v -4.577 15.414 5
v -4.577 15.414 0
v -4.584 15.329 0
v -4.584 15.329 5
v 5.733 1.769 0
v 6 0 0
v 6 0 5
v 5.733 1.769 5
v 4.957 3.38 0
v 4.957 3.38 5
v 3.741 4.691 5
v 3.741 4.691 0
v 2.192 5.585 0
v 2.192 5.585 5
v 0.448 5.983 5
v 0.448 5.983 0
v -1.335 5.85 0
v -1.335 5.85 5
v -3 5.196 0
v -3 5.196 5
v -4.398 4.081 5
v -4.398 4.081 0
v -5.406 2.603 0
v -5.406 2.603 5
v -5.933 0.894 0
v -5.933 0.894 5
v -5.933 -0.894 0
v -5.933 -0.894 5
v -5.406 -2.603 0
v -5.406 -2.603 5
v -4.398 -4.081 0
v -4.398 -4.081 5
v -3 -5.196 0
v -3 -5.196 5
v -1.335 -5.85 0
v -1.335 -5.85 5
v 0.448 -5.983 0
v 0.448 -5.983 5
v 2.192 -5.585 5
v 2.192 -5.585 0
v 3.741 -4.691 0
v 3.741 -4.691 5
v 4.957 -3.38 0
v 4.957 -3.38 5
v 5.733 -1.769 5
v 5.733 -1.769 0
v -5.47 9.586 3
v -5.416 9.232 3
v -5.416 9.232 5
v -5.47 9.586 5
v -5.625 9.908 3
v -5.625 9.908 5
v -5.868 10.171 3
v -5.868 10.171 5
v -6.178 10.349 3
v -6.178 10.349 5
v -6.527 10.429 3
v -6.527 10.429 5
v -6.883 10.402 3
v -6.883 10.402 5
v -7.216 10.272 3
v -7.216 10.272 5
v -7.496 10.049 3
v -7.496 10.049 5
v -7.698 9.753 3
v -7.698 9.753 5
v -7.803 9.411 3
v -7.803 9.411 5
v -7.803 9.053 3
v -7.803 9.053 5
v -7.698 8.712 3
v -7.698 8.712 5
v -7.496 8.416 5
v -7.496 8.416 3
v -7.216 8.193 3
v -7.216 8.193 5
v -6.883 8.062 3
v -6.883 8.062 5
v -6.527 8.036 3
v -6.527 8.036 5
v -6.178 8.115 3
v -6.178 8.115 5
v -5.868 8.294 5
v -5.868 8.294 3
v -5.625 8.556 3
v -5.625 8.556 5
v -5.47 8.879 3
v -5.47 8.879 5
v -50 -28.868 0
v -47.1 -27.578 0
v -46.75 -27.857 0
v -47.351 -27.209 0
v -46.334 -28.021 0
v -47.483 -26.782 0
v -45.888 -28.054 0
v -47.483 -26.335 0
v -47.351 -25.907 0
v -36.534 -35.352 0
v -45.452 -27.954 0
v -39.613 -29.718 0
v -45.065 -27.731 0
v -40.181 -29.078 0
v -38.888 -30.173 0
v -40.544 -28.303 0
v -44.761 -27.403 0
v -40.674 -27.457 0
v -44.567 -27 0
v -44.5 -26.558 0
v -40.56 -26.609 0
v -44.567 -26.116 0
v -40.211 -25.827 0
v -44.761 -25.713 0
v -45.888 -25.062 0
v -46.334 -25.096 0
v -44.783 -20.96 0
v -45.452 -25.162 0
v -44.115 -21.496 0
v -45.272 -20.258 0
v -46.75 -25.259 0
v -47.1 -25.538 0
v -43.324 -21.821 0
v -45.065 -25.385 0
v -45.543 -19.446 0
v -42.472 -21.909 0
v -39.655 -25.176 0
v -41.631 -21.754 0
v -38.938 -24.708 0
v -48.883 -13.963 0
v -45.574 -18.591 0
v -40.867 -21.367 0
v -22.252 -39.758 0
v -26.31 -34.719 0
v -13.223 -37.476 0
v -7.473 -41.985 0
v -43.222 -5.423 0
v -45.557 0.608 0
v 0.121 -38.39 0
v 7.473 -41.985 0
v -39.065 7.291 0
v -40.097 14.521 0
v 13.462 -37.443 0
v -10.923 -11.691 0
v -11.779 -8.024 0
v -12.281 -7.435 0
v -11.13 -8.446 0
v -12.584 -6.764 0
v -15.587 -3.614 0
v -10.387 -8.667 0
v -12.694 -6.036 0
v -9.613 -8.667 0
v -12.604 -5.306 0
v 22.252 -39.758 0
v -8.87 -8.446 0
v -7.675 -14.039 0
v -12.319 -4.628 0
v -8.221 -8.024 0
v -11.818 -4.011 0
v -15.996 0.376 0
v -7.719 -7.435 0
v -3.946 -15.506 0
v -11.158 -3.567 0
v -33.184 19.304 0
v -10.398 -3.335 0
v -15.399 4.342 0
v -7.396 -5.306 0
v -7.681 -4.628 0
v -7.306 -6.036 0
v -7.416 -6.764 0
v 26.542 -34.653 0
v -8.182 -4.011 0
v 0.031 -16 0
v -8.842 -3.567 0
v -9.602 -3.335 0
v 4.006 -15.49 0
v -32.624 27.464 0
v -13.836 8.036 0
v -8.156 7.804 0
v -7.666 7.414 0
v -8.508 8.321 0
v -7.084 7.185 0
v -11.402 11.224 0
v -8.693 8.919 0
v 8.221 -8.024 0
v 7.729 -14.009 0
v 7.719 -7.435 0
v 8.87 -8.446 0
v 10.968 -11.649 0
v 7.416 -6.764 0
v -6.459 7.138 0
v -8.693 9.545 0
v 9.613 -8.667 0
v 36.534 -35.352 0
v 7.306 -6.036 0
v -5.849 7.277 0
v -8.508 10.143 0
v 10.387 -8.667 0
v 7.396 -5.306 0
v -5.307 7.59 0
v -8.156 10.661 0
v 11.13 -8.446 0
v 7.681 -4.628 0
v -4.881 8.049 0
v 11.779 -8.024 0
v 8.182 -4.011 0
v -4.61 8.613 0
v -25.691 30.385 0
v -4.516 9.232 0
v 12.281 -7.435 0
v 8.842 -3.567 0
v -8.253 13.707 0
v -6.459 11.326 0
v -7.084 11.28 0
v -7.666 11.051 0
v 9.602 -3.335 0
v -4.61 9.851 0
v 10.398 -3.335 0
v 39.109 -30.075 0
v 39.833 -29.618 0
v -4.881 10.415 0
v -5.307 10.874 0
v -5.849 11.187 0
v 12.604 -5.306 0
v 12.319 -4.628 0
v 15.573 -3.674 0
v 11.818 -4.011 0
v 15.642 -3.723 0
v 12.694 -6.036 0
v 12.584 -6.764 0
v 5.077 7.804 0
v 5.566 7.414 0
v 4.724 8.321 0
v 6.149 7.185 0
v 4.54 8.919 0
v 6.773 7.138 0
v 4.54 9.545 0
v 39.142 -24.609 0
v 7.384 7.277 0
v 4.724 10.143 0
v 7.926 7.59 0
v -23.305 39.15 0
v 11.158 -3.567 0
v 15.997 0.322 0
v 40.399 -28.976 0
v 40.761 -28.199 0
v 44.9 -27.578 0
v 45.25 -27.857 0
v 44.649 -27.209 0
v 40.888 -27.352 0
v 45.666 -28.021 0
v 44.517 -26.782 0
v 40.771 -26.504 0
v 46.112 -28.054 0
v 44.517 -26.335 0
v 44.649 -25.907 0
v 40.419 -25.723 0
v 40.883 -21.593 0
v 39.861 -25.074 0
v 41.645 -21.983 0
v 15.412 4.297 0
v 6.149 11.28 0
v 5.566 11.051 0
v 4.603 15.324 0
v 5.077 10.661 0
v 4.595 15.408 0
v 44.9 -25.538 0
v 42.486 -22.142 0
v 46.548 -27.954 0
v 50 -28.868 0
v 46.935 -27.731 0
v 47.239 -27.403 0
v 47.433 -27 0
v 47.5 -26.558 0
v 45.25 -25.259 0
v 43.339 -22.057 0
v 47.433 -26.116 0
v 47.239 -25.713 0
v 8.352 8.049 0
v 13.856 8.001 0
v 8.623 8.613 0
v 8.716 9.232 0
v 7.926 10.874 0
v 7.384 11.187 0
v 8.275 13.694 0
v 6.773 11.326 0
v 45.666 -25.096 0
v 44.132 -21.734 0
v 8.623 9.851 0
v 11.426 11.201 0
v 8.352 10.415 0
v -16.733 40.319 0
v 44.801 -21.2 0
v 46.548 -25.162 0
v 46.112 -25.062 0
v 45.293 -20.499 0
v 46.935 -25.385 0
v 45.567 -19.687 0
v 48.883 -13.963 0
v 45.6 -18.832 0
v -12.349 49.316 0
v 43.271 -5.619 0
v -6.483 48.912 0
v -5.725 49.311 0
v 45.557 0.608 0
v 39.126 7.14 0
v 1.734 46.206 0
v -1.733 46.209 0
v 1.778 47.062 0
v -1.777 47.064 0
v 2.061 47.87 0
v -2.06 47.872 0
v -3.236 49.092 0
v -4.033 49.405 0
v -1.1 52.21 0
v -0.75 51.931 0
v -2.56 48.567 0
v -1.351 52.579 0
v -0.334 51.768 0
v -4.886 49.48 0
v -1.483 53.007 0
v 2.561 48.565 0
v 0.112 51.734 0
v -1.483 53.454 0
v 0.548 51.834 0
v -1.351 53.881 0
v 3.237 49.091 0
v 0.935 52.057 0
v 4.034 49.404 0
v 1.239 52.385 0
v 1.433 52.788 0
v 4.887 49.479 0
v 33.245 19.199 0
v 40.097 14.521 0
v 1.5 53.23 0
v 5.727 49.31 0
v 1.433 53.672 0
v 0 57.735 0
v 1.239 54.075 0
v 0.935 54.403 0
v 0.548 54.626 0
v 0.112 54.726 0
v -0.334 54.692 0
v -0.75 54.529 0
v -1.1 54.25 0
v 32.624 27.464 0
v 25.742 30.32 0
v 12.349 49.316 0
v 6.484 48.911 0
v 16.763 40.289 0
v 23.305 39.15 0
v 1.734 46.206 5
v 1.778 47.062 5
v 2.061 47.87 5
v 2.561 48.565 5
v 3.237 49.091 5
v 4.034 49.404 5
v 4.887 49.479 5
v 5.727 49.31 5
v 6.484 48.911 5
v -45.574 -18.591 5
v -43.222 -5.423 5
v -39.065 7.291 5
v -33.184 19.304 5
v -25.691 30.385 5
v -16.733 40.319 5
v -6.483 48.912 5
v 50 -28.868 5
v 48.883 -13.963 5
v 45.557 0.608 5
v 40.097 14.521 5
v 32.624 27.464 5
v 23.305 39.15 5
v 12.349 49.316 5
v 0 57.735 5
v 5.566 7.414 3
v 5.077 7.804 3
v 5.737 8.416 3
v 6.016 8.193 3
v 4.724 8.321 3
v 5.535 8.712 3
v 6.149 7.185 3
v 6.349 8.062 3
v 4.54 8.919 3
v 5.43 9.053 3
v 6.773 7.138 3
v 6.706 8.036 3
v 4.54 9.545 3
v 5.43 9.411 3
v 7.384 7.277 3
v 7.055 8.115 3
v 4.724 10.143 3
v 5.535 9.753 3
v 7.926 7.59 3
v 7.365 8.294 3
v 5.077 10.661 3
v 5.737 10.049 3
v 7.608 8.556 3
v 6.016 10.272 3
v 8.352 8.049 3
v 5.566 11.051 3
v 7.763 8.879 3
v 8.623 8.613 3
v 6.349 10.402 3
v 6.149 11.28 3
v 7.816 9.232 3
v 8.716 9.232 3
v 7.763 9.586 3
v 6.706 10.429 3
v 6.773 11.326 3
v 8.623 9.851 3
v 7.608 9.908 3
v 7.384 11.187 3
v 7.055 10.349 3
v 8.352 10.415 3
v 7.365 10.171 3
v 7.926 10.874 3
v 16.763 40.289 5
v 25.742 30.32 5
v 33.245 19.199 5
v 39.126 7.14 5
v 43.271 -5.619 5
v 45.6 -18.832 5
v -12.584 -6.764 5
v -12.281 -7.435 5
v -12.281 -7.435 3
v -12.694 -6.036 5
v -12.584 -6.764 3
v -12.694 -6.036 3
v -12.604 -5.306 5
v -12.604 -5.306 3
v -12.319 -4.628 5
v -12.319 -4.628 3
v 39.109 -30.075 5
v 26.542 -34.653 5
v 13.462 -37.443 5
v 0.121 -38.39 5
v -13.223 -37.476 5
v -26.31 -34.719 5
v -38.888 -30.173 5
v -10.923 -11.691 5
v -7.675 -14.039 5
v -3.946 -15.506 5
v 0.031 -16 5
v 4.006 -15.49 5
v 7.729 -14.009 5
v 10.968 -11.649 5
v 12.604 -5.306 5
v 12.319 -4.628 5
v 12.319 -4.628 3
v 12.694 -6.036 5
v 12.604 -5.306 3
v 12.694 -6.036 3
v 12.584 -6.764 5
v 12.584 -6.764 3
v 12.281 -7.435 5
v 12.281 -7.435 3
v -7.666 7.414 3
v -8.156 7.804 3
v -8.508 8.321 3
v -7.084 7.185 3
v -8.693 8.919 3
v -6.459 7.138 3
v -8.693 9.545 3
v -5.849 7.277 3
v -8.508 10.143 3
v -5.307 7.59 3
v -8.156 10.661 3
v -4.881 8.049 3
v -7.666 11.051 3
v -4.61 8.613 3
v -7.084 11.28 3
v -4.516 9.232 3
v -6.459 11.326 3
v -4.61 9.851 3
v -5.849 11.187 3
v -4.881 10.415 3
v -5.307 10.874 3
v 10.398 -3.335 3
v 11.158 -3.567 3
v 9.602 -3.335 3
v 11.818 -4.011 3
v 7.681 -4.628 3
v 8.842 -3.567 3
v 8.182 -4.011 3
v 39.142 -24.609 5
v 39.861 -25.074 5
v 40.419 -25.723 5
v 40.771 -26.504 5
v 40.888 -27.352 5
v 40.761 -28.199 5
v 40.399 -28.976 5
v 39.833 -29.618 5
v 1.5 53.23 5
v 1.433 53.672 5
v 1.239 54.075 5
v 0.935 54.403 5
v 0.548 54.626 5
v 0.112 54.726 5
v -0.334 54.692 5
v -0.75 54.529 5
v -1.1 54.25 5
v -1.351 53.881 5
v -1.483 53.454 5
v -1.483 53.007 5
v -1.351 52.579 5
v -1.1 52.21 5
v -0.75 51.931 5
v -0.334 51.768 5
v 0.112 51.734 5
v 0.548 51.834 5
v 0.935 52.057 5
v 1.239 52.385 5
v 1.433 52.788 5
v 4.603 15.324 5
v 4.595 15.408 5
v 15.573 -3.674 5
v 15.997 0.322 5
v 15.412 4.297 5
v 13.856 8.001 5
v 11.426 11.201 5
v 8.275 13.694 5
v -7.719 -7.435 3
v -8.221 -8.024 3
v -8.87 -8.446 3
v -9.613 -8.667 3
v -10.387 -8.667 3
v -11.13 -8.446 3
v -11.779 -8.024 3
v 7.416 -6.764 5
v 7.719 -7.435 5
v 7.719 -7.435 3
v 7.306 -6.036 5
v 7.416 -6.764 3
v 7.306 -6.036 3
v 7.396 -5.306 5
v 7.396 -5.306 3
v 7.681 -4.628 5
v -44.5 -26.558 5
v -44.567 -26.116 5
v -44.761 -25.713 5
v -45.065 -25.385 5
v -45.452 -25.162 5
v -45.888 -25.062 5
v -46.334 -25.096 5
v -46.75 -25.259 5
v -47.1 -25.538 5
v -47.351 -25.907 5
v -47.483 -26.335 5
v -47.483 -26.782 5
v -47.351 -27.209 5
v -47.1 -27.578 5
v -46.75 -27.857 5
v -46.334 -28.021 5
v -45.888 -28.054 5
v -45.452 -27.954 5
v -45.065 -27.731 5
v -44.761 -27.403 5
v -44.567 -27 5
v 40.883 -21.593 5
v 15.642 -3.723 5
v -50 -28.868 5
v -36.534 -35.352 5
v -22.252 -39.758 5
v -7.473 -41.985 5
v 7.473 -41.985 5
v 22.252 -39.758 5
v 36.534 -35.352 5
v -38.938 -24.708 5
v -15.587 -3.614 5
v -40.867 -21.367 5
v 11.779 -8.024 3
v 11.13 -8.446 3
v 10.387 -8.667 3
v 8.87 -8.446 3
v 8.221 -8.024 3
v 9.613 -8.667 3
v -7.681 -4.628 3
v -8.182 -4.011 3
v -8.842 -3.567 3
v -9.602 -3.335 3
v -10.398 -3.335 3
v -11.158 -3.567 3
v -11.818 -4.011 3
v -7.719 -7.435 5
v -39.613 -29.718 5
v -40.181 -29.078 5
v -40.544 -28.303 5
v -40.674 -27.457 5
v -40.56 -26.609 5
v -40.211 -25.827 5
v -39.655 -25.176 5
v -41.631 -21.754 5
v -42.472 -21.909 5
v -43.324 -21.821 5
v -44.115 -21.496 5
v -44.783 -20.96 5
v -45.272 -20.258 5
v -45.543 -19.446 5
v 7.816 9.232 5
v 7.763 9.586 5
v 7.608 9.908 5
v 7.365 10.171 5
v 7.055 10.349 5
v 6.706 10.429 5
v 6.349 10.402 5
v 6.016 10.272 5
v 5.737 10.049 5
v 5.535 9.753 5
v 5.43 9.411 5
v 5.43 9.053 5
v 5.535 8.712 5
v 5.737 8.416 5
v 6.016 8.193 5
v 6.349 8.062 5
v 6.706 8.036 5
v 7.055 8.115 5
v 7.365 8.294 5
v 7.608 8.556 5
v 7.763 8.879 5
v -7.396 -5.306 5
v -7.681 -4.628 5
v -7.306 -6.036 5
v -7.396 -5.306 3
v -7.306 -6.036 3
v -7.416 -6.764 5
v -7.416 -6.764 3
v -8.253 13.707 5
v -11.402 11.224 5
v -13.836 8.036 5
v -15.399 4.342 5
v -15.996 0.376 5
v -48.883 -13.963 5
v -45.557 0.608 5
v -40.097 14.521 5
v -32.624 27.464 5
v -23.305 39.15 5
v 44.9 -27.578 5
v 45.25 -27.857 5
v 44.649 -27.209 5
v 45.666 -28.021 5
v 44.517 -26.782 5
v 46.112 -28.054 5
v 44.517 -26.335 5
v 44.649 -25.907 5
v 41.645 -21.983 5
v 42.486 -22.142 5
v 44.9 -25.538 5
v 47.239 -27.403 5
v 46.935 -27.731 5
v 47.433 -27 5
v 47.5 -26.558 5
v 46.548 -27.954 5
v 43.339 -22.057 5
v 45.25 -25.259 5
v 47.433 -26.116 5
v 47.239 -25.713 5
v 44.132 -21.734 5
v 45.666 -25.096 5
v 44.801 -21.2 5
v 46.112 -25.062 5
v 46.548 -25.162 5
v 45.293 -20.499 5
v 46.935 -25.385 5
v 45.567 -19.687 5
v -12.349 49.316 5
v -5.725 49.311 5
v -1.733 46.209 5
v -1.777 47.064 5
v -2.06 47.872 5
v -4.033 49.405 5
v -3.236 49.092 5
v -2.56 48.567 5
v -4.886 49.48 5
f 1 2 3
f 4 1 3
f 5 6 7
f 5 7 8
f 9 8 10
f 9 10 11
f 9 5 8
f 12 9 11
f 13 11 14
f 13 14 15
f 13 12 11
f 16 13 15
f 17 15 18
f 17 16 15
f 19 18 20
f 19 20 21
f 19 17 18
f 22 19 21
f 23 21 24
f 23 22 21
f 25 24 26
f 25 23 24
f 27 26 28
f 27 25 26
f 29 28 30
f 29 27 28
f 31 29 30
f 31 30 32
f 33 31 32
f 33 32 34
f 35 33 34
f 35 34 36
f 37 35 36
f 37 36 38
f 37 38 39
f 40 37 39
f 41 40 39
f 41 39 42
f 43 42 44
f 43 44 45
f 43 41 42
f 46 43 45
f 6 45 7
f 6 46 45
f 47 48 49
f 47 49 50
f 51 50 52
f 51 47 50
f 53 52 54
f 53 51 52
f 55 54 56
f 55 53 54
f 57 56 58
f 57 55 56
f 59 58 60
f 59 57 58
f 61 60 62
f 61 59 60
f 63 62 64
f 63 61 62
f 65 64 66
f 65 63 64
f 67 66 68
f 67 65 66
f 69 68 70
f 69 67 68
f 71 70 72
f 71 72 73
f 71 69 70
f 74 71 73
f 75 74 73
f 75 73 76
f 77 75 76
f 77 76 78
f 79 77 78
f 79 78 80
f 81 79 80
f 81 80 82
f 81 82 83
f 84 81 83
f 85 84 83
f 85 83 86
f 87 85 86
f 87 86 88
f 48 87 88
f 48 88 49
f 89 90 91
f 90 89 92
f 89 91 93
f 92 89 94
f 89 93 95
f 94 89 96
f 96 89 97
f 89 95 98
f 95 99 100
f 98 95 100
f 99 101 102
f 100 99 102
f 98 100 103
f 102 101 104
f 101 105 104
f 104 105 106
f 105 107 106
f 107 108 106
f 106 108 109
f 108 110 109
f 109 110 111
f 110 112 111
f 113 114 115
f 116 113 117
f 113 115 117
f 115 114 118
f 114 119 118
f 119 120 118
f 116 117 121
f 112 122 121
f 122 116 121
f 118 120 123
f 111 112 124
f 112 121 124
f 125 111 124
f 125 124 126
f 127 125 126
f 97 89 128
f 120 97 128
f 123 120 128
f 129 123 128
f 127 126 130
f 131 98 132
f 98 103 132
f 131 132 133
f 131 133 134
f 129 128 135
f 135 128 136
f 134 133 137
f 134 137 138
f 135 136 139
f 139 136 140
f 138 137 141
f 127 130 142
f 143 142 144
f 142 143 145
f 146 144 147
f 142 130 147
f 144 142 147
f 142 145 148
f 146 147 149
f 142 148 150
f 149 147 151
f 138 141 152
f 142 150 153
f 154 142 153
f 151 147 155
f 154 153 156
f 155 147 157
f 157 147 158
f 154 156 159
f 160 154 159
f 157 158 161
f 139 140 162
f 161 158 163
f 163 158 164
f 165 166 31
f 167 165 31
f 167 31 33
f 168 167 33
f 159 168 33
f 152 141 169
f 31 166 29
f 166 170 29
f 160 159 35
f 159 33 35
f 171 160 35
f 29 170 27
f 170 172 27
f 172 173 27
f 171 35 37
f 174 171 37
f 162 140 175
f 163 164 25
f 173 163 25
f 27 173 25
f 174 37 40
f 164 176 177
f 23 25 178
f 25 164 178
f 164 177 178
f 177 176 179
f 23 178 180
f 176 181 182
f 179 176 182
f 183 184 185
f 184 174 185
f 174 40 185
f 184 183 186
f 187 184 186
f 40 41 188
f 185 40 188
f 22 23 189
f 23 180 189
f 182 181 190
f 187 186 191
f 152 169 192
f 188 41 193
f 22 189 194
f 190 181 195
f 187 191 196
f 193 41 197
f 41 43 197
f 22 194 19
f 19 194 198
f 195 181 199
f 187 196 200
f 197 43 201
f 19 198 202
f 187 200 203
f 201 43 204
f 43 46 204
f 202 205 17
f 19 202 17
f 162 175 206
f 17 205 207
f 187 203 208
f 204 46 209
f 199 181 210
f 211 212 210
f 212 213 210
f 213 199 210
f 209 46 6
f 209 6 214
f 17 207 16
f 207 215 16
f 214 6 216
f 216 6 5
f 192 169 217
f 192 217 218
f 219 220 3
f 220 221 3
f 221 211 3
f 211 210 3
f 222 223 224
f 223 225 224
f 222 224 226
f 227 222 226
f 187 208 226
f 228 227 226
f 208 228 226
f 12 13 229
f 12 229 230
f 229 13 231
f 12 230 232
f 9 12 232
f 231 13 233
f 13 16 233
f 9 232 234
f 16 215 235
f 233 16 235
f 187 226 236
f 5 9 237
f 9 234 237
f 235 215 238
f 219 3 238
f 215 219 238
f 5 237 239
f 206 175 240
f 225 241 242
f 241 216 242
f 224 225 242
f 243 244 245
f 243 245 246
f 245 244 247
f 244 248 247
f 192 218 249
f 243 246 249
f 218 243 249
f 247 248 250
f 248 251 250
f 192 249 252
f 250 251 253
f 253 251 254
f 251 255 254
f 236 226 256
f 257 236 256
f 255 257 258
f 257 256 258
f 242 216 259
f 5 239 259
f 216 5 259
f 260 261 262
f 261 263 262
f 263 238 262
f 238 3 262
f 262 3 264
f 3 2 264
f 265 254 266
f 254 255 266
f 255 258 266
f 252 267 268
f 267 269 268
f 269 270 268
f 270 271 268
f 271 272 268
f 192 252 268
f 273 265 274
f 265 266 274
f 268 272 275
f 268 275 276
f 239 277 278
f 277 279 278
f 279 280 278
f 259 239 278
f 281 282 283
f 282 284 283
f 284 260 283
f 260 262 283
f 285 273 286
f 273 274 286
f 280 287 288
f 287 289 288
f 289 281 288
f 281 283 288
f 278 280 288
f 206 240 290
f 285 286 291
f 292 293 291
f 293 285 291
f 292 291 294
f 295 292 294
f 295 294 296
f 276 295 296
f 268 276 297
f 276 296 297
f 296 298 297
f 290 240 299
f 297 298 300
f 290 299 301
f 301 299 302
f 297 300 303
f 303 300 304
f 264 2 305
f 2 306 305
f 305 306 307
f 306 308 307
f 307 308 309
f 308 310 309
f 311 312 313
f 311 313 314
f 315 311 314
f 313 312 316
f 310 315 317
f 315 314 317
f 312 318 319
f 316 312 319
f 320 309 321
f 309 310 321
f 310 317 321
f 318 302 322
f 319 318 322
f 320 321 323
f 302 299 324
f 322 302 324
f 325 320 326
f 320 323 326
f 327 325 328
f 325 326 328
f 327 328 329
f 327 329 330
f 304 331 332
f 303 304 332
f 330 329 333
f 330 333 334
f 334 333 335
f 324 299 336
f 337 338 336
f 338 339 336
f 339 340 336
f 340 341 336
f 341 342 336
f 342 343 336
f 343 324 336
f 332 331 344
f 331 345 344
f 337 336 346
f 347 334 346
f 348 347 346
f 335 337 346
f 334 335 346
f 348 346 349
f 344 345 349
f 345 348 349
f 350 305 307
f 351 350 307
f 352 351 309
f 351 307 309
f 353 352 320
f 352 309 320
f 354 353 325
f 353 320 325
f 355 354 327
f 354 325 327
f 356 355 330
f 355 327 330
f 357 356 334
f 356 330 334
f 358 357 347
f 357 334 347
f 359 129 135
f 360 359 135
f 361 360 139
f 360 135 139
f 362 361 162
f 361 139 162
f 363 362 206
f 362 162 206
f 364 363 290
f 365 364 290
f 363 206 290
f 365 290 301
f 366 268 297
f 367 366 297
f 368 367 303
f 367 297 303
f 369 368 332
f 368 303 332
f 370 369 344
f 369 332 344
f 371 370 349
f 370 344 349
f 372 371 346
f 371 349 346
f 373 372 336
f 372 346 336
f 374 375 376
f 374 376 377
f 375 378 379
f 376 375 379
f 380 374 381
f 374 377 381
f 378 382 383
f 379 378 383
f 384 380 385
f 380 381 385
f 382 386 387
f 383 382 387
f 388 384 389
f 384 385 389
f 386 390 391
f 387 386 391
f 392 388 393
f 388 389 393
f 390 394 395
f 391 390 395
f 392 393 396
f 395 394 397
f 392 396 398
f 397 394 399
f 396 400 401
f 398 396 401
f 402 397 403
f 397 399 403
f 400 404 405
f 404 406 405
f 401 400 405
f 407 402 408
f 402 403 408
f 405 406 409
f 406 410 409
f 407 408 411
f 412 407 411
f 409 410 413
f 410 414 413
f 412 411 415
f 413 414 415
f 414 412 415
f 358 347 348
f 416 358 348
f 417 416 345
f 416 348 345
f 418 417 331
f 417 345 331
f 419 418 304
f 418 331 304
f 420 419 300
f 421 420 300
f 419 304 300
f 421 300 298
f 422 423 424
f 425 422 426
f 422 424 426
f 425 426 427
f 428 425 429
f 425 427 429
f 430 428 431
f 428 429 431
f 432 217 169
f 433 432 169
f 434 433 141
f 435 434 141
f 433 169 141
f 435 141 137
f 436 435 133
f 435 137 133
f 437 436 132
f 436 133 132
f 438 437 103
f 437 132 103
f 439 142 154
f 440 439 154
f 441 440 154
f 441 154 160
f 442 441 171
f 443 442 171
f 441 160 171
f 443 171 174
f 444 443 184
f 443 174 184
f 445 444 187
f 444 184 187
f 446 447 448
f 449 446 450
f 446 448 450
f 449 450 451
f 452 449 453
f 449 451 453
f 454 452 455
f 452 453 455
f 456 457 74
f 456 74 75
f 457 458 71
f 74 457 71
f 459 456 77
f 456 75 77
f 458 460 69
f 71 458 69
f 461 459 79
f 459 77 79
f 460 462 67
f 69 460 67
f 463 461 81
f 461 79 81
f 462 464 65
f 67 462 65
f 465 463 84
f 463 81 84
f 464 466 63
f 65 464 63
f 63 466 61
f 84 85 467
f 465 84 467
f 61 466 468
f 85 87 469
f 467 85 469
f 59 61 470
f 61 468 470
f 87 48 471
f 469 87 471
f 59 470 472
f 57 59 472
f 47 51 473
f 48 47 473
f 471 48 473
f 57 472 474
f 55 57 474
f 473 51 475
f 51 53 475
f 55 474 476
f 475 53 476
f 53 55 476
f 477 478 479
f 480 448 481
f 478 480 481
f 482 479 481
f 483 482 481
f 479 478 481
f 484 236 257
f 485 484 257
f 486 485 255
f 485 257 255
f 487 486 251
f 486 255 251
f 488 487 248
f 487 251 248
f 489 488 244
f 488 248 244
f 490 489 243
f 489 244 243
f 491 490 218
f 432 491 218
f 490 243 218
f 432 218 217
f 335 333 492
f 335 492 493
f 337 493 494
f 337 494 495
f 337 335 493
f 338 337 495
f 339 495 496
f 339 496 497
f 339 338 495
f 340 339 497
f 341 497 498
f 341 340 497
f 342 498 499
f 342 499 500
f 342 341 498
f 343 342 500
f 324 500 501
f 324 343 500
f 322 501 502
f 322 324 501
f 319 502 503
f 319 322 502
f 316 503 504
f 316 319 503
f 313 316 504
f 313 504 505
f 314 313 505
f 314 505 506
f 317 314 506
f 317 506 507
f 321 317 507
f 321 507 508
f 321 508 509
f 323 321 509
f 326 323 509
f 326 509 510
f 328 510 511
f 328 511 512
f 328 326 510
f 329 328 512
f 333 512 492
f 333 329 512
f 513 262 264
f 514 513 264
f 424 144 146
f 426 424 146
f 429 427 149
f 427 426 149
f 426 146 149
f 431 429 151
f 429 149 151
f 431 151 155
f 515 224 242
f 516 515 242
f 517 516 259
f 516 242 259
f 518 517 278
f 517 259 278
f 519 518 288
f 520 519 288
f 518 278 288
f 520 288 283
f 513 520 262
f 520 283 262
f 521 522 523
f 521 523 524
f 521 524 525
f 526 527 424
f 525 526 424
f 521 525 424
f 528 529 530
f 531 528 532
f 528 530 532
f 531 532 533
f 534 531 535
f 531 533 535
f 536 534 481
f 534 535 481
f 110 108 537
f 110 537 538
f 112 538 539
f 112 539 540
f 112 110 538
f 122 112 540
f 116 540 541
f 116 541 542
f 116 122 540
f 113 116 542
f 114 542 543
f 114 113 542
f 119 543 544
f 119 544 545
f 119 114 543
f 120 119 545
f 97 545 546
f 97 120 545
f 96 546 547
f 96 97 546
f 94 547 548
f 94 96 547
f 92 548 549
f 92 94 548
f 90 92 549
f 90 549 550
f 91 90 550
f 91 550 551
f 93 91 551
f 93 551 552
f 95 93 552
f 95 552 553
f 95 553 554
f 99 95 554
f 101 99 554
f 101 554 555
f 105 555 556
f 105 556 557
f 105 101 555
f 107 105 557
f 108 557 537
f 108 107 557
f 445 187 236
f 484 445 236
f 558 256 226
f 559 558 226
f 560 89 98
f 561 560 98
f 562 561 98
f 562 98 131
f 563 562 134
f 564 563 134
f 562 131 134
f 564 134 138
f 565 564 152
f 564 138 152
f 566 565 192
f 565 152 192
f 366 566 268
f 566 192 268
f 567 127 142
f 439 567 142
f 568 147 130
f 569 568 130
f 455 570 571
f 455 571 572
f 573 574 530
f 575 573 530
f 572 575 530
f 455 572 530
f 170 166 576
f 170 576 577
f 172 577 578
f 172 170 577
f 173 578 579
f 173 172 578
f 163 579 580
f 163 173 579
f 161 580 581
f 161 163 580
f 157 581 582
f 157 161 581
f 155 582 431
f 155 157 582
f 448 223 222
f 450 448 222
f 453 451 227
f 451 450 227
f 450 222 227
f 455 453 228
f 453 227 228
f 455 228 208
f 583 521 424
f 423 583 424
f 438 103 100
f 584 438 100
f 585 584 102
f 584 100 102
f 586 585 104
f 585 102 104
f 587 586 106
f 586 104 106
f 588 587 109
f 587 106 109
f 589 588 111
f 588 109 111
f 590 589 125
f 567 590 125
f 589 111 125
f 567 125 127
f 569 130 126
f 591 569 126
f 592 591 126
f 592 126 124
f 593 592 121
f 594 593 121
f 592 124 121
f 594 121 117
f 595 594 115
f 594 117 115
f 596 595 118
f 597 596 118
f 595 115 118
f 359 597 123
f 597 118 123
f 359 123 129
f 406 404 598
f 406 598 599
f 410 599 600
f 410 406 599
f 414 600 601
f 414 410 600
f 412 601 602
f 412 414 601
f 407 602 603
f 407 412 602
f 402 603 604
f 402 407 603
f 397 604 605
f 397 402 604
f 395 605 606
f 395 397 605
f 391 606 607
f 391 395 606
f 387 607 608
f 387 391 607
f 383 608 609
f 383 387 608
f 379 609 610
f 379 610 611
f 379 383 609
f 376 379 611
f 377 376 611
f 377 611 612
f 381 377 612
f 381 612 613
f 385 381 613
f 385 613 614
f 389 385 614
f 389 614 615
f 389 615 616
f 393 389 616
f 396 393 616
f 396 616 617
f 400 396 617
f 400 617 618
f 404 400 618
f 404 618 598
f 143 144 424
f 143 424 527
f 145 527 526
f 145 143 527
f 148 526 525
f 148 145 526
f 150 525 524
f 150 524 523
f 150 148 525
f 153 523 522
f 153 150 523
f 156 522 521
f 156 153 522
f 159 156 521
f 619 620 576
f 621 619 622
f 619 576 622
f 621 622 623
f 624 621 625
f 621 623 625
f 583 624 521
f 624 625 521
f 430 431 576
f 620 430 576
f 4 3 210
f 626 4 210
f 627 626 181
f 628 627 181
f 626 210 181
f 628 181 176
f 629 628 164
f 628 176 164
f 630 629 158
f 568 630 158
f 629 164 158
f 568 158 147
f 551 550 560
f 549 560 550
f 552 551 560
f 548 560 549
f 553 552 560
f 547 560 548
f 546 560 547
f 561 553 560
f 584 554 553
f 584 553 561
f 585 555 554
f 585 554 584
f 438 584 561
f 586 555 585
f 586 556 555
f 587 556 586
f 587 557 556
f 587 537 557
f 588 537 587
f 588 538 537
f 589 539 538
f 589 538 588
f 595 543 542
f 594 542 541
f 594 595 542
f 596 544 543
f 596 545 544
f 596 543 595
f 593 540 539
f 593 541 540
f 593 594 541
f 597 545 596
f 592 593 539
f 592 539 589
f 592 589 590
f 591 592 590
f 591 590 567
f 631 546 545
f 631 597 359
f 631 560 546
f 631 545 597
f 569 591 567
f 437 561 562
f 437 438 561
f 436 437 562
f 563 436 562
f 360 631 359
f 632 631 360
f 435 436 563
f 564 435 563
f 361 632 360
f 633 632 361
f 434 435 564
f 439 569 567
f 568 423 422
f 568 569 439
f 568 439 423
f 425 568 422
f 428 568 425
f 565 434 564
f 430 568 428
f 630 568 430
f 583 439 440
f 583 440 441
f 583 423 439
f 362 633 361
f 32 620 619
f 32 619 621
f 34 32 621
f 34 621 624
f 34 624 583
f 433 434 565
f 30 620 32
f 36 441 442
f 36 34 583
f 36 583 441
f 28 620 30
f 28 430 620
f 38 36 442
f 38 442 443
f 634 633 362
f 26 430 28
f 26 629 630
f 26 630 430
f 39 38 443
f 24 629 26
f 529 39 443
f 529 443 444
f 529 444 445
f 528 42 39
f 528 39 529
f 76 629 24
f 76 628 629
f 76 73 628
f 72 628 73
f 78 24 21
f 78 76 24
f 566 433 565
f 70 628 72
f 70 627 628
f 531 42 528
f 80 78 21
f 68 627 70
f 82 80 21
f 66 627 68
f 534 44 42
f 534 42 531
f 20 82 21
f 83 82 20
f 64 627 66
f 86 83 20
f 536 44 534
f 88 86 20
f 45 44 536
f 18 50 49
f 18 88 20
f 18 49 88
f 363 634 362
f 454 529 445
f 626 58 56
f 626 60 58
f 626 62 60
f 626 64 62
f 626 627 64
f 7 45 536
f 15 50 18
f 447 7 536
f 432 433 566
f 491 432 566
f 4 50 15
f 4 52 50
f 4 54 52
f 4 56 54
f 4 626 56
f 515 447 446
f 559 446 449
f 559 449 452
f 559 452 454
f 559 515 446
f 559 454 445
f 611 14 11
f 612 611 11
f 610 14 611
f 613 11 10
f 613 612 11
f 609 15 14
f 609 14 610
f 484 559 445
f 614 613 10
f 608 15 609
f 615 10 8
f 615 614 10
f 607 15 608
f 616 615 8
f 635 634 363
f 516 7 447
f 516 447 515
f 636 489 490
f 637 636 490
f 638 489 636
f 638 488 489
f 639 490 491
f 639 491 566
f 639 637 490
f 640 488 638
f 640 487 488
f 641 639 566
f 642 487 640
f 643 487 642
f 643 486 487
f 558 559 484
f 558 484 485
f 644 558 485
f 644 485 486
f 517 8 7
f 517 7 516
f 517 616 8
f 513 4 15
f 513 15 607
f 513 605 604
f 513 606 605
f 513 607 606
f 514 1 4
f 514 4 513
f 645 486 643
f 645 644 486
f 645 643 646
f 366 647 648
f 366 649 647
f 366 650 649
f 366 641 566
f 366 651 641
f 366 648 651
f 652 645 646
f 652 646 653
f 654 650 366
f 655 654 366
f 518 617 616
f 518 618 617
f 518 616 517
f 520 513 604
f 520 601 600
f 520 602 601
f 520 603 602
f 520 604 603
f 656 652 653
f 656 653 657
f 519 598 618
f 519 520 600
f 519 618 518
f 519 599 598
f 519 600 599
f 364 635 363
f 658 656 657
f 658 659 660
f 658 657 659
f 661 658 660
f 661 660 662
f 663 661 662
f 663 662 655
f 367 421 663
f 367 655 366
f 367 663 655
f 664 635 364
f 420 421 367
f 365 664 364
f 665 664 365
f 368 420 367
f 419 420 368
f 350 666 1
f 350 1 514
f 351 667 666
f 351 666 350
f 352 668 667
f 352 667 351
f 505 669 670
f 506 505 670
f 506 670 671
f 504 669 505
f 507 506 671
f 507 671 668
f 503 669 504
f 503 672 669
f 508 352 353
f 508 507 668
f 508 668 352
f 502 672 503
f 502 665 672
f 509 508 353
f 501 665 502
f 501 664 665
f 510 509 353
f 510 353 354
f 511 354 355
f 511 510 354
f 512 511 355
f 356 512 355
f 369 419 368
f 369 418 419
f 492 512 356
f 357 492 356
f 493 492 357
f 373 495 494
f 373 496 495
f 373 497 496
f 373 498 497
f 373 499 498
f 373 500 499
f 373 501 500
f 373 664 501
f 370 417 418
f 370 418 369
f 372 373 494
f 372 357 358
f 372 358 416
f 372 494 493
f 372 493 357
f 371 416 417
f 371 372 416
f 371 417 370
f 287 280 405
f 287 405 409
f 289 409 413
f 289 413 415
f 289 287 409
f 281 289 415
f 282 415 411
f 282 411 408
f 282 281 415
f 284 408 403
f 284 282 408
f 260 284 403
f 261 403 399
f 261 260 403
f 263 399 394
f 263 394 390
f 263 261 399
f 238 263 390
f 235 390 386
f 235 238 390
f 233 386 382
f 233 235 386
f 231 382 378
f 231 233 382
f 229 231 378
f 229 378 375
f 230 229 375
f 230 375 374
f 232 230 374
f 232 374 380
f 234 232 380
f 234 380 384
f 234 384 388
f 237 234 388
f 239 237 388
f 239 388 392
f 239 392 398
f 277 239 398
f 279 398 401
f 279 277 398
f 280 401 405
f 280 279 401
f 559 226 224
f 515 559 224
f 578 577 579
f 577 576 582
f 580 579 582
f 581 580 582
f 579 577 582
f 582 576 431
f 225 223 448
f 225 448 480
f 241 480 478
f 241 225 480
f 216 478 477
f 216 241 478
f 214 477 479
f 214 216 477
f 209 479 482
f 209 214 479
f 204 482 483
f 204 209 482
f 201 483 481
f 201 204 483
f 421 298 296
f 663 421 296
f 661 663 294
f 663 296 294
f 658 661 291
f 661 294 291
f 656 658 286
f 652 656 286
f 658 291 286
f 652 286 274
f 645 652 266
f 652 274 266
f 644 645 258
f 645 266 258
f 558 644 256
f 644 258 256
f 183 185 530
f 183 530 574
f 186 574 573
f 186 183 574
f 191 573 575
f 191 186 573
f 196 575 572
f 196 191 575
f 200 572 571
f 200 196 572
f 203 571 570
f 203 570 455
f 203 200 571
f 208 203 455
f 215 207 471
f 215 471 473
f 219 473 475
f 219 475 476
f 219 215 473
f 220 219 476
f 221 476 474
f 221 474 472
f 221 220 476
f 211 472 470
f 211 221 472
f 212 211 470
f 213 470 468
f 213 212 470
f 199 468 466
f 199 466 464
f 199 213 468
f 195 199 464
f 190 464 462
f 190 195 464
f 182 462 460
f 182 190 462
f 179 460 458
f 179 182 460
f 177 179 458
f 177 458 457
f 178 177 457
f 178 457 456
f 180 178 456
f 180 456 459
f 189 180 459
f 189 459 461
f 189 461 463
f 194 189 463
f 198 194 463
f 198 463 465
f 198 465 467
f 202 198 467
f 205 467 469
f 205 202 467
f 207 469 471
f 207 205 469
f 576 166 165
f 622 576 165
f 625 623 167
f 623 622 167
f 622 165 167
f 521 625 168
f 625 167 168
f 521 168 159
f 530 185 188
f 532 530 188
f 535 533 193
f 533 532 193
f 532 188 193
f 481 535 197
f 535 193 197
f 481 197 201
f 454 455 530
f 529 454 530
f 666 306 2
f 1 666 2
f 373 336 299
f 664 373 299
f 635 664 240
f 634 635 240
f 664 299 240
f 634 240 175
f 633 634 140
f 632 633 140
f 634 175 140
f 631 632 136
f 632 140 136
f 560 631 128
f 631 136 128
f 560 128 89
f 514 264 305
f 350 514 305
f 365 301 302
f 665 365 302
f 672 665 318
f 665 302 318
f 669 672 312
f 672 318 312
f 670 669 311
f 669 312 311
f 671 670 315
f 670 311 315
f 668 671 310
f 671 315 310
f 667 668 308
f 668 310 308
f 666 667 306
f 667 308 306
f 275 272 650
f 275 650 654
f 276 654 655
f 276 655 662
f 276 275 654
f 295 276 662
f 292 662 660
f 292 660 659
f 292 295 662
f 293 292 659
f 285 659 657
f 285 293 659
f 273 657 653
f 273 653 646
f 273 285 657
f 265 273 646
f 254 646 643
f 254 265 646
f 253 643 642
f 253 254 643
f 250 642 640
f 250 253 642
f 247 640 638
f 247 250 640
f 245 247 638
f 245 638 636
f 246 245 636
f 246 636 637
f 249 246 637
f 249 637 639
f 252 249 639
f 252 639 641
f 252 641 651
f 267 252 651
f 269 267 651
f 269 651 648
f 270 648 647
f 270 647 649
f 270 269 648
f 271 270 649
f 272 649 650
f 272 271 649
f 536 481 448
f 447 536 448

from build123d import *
from build123d.topology import SkipClean

# Parameters (mm, degrees)
SKETCH_1_R          = 6
SKETCH_1_R_2        = 1.5
SKETCH_1_R_3        = 1.2
EXTRUDE_3_DEPTH     = 5
SKETCH_1_128_R      = 2.1
SKETCH_1_128_R_2    = 2.694546499
CUT_EXTRUDE_1_DEPTH = 3


with BuildPart() as part:
    # 草图1 → 凸台-拉伸3 (new body)
    with BuildSketch(Plane.XY):
        with BuildLine():
            ThreePointArc((-50, -28.867513459), (0, -42.264973081), (50, -28.867513459))
            ThreePointArc((50, -28.867513459), (36.602540378, 21.132486541), (0, 57.735026919))
            ThreePointArc((0, 57.735026919), (-36.602540378, 21.132486541), (-50, -28.867513459))
        make_face()
        with BuildLine():
            Line((-12.318904501, -4.627679794), (-7.681095499, -4.627679794))
            ThreePointArc((-7.681095499, -4.627679794), (-7.305700474, -6.036481484), (-7.719101931, -7.434602674))
            Line((-7.719101931, -7.434602674), (-12.280898069, -7.434602674))
            ThreePointArc((-12.280898069, -7.434602674), (-12.694299526, -6.036481484), (-12.318904501, -4.627679794))
        make_face(mode=Mode.SUBTRACT)
        with BuildLine():
            ThreePointArc((-4.584422556, 15.329157506), (-13.835670885, 8.03580806), (-15.586551128, -3.613782498))
            Line((-15.586551128, -3.613782498), (-40.867216831, -21.36673515))
            ThreePointArc((-40.867216831, -21.36673515), (-44.11523634, -21.495718376), (-45.57409004, -18.590892513))
            ThreePointArc((-45.57409004, -18.590892513), (-33.183543116, 19.304197945), (-6.482898448, 48.912289883))
            ThreePointArc((-6.482898448, 48.912289883), (-3.236245956, 49.092161401), (-1.732813457, 46.208969266))
            Line((-1.732813457, 46.208969266), (-4.57661325, 15.413723751))
            Line((-4.57661325, 15.413723751), (-4.584422556, 15.329157506))
        make_face(mode=Mode.SUBTRACT)
        with BuildLine():
            Line((4.60262837, 15.323700992), (4.594769235, 15.408321271))
            Line((4.594769235, 15.408321271), (1.734391802, 46.206359162))
            ThreePointArc((1.734391802, 46.206359162), (3.23701886, 49.090744976), (6.484377608, 48.91121571))
            ThreePointArc((6.484377608, 48.91121571), (33.24460594, 19.198599415), (45.599673385, -18.831673998))
            ThreePointArc((45.599673385, -18.831673998), (44.131781944, -21.73382662), (40.882557513, -21.593342745))
            Line((40.882557513, -21.593342745), (15.64187559, -3.722901655))
            Line((15.64187559, -3.722901655), (15.57251534, -3.673794493))
            ThreePointArc((15.57251534, -3.673794493), (13.855876537, 8.000917785), (4.60262837, 15.323700992))
        make_face(mode=Mode.SUBTRACT)
        with BuildLine():
            ThreePointArc((-10.923034521, -11.691335119), (0.030725767, -15.999970498), (10.967857029, -11.649296639))
            Line((10.967857029, -11.649296639), (39.141662126, -24.608662006))
            ThreePointArc((39.141662126, -24.608662006), (40.887936946, -27.352330968), (39.108544771, -30.074638556))
            ThreePointArc((39.108544771, -30.074638556), (0.120715527, -38.389897283), (-38.887875634, -30.17258796))
            ThreePointArc((-38.887875634, -30.17258796), (-40.674081889, -27.456751691), (-38.938338523, -24.708389561))
            Line((-38.938338523, -24.708389561), (-10.923034521, -11.691335119))
        make_face(mode=Mode.SUBTRACT)
        with BuildLine():
            ThreePointArc((7.719101931, -7.434602674), (7.305700474, -6.036481484), (7.681095499, -4.627679794))
            Line((7.681095499, -4.627679794), (12.318904501, -4.627679794))
            ThreePointArc((12.318904501, -4.627679794), (12.694299526, -6.036481484), (12.280898069, -7.434602674))
            Line((12.280898069, -7.434602674), (7.719101931, -7.434602674))
        make_face(mode=Mode.SUBTRACT)
        Circle(SKETCH_1_R, mode=Mode.SUBTRACT)
        with Locations((-46, -26.558112383)):
            Circle(SKETCH_1_R_2, mode=Mode.SUBTRACT)
        with Locations((46, -26.558112383)):
            Circle(SKETCH_1_R_2, mode=Mode.SUBTRACT)
        with Locations((0, 53.230084709)):
            Circle(SKETCH_1_R_2, mode=Mode.SUBTRACT)
        with Locations((-6.616406845, 9.232315636)):
            Circle(SKETCH_1_R_3, mode=Mode.SUBTRACT)
        with Locations((6.616406845, 9.232315636)):
            Circle(SKETCH_1_R_3, mode=Mode.SUBTRACT)
    extrude(amount=EXTRUDE_3_DEPTH)

    # 草图1<128> → 切除-拉伸1 (cut)
    with SkipClean():  # the faces are left unmerged after this step: merging them gives an invalid solid
        with BuildSketch(Plane.XY):
            with Locations((-6.616406845, 9.232315636)):
                Circle(SKETCH_1_128_R)
            with Locations((6.616406845, 9.232315636)):
                Circle(SKETCH_1_128_R)
            with Locations((-10, -6)):
                Circle(SKETCH_1_128_R_2)
            with Locations((10, -6)):
                Circle(SKETCH_1_128_R_2)
        extrude(amount=CUT_EXTRUDE_1_DEPTH, mode=Mode.SUBTRACT)


solid = part.part
